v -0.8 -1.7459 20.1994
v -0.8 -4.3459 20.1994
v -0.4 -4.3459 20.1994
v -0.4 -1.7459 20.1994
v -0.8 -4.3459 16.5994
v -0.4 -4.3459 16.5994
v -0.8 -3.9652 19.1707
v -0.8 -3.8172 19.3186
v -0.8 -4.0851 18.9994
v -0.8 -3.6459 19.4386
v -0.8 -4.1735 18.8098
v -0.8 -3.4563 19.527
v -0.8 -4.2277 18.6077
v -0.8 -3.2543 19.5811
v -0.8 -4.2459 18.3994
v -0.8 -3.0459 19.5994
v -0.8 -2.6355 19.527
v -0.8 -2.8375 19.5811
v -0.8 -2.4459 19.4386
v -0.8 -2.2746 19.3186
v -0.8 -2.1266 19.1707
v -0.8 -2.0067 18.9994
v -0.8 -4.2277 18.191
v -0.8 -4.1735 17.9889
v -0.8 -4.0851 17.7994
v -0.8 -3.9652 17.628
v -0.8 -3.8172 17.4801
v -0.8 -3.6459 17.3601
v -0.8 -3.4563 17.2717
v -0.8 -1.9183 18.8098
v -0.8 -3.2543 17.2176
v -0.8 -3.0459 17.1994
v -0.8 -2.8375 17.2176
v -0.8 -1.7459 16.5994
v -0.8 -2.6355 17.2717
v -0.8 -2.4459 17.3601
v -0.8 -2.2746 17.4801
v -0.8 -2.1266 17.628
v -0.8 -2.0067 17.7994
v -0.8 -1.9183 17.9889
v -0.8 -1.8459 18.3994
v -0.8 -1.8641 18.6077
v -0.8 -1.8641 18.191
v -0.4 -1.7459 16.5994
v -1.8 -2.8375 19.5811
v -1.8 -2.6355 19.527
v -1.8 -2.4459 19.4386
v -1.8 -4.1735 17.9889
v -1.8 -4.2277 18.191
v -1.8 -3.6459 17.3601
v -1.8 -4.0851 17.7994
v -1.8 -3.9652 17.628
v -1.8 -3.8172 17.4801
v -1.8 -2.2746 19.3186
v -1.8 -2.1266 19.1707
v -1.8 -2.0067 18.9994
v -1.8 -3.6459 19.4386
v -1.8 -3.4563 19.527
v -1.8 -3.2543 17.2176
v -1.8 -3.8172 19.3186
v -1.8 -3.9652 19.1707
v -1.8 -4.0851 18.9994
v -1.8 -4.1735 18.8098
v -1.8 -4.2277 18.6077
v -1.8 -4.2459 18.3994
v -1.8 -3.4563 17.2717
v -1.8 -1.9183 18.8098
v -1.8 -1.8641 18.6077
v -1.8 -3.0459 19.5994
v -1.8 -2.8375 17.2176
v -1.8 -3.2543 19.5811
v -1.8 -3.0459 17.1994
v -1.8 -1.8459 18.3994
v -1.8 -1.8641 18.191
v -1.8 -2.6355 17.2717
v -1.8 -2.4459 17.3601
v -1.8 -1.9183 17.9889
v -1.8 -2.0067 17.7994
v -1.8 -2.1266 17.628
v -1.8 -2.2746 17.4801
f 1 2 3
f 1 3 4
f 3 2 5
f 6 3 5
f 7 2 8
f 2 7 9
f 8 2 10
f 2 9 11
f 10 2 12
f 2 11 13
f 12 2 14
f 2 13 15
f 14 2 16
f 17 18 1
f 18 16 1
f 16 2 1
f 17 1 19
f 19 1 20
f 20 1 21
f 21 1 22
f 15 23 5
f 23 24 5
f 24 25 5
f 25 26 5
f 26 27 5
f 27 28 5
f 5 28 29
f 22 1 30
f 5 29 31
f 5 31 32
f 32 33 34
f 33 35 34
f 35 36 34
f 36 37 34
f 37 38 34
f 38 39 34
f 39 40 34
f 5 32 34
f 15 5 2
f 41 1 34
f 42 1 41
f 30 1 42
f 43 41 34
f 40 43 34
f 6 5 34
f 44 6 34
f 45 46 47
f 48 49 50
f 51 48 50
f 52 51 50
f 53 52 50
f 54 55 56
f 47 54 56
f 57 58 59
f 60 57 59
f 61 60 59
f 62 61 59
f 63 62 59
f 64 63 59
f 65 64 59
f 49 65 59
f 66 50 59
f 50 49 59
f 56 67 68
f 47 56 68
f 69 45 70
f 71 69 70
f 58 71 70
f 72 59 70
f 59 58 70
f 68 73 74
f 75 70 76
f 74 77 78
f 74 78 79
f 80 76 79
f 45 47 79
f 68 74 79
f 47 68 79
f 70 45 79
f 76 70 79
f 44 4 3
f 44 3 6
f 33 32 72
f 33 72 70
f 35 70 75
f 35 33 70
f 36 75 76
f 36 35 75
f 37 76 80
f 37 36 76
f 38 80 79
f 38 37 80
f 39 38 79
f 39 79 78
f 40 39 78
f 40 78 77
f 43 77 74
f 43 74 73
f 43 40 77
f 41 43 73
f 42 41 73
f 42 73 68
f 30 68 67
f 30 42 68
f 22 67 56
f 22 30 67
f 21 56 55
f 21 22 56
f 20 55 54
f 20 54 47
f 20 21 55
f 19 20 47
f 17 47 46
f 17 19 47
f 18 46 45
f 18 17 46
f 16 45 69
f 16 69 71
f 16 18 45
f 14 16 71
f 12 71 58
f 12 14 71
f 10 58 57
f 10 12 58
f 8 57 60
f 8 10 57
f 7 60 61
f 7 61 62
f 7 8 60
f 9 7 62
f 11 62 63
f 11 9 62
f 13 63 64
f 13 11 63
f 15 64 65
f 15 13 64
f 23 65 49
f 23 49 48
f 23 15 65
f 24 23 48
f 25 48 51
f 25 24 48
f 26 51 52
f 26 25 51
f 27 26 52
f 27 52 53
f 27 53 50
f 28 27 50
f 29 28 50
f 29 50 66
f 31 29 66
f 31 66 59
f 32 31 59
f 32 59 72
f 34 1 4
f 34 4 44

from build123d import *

# Parameters (mm, degrees)
AUFSATZ_LINEAR_START                = -0.4
AUFSATZ_LINEAR_AUSTRAGEN1_OUTLINE_W = 3.6
AUFSATZ_LINEAR_AUSTRAGEN1_OUTLINE_H = 2.6
AUFSATZ_LINEAR_AUSTRAGEN1_DEPTH     = 0.4
SKIZZE2_R                           = 1.2
AUFSATZ_LINEAR_AUSTRAGEN2_DEPTH     = 1


# Read off the part's stored shape, not the designer's step: Aufsatz-Linear austragen1
with BuildPart() as part:
    # Aufsatz-Linear austragen1 outline → Aufsatz-Linear austragen1 (new body)
    with BuildSketch(Plane(origin=(-0.4, 0, 0), x_dir=(0, 0, -1), z_dir=(1, 0, 0)).offset(AUFSATZ_LINEAR_START)):
        with Locations((-18.399365347, -3.04590093)):
            Rectangle(AUFSATZ_LINEAR_AUSTRAGEN1_OUTLINE_W, AUFSATZ_LINEAR_AUSTRAGEN1_OUTLINE_H)
    extrude(amount=AUFSATZ_LINEAR_AUSTRAGEN1_DEPTH)

    # Skizze2 → Aufsatz-Linear austragen2 (add)
    with BuildSketch(Plane(origin=(-0.8, 0, 0), x_dir=(0, 0, -1), z_dir=(1, 0, 0))):
        with Locations((-18.399365347, -3.04590093)):
            Circle(SKIZZE2_R)
    extrude(amount=-AUFSATZ_LINEAR_AUSTRAGEN2_DEPTH)


solid = part.part
